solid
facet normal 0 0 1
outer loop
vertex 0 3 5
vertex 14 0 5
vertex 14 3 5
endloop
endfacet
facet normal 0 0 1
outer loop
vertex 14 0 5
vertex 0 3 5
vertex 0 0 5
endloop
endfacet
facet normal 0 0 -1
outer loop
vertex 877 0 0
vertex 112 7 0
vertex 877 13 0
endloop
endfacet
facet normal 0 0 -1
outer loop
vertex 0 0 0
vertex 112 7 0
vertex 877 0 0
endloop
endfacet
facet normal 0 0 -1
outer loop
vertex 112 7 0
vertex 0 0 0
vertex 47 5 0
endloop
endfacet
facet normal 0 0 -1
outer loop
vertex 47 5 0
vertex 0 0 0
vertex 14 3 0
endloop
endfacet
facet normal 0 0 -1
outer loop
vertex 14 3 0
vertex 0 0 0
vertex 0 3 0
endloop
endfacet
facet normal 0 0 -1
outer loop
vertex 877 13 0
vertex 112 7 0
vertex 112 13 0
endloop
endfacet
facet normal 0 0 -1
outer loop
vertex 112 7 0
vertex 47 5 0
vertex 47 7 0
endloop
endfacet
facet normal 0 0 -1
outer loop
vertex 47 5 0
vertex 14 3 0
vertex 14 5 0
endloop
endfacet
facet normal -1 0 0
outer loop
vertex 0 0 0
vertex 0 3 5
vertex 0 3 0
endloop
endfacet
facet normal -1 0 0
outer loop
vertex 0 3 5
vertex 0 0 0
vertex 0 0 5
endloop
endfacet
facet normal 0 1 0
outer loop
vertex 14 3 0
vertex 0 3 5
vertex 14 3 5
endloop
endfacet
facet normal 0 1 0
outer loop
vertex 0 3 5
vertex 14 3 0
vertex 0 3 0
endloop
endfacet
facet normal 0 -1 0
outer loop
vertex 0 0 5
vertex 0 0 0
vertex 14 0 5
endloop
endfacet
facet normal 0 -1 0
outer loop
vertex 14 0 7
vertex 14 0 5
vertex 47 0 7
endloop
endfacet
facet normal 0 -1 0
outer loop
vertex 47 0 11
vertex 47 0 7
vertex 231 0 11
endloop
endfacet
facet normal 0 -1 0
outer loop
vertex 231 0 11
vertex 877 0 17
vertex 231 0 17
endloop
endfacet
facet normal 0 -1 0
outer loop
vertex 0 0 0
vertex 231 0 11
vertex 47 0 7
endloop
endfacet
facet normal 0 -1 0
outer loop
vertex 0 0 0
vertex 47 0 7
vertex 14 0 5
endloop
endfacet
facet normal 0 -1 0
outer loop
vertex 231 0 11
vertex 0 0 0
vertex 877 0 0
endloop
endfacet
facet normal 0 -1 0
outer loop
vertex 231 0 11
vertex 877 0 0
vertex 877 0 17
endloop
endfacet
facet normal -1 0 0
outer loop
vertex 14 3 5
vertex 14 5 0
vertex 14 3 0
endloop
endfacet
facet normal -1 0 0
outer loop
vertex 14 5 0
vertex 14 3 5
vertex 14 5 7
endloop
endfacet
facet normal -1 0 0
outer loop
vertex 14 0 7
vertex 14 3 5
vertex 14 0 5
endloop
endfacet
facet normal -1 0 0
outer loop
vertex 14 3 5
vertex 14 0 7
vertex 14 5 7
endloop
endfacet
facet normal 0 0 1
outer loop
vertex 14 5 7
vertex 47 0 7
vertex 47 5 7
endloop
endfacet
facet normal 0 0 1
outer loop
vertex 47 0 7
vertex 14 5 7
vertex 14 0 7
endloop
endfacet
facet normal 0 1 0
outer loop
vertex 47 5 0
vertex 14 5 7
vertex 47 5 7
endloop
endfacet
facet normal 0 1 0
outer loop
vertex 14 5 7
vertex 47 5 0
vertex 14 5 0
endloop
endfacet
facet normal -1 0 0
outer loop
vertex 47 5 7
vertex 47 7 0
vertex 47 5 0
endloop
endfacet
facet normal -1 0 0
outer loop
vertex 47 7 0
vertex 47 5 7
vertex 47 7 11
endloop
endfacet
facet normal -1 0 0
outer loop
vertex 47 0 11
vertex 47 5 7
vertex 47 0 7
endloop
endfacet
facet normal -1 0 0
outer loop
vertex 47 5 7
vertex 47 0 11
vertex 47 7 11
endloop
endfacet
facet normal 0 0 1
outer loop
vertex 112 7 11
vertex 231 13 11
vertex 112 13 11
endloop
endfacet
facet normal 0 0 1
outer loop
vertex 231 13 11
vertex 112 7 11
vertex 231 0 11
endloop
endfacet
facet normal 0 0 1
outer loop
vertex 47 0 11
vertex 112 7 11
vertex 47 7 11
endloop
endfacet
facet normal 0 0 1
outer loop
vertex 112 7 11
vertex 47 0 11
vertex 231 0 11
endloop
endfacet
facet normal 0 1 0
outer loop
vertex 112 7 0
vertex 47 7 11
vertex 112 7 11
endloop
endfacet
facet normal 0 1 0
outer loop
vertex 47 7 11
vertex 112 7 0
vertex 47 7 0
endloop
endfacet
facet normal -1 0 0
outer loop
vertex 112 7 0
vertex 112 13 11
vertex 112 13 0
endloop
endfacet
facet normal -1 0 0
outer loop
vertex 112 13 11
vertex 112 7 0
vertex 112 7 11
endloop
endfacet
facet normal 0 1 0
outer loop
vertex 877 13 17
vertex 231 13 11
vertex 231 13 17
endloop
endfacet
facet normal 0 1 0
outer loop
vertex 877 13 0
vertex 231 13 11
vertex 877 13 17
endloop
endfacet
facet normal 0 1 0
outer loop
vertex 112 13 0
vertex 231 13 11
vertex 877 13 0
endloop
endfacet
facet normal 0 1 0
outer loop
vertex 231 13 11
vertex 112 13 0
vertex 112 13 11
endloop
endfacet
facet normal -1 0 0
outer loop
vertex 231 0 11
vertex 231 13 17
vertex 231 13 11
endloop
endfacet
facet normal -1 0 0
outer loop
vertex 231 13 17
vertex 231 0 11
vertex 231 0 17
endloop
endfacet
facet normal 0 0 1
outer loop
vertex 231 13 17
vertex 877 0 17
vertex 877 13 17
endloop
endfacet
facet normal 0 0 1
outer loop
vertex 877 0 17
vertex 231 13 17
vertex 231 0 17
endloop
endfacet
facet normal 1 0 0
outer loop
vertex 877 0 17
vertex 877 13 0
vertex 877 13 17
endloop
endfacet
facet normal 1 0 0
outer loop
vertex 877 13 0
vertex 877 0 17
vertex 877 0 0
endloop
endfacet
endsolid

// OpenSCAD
translate([1.0, 1.5, 2.5]) color([0.2855057910835891, 0.5410756974595614, 0.2011850454737838]) cube([2, 3, 5], center=true);
translate([3.0, 1.5, 2.5]) color([0.2966412512769129, 0.44178363318767744, 0.604669902191143]) cube([2, 3, 5], center=true);
translate([5.0, 1.5, 2.5]) color([0.5361650260862432, 0.2609879767339395, 0.23178787541805523]) cube([2, 3, 5], center=true);
translate([7.0, 1.5, 2.5]) color([0.11873023670071103, 0.7834936358921726, 0.09890076646638046]) cube([2, 3, 5], center=true);
translate([9.0, 1.5, 2.5]) color([0.7328850061793606, 0.2487736956630997, 0.28455698400578255]) cube([2, 3, 5], center=true);
translate([11.0, 1.5, 2.5]) color([0.7360834330107994, 0.6596207917216363, 0.7419215555155583]) cube([2, 3, 5], center=true);
translate([13.0, 1.5, 2.5]) color([0.5152830587943614, 0.8590958196652707, 0.12179389137547159]) cube([2, 3, 5], center=true);
translate([15.5, 2.5, 3.5]) color([0.6451969614065052, 0.11824431248865597, 0.7372833681454282]) cube([3, 5, 7], center=true);
translate([18.5, 2.5, 3.5]) color([0.3589046614584527, 0.67488210437111, 0.7034839134412817]) cube([3, 5, 7], center=true);
translate([21.5, 2.5, 3.5]) color([0.6606084576410584, 0.22155798032782648, 0.8317998863873537]) cube([3, 5, 7], center=true);
translate([24.5, 2.5, 3.5]) color([0.24013608742346748, 0.5181532972121122, 0.6746457541533513]) cube([3, 5, 7], center=true);
translate([27.5, 2.5, 3.5]) color([0.23360317478475656, 0.628511722983939, 0.2868310479973286]) cube([3, 5, 7], center=true);
translate([30.5, 2.5, 3.5]) color([0.1713823760843869, 0.809748828526577, 0.5531227700773604]) cube([3, 5, 7], center=true);
translate([33.5, 2.5, 3.5]) color([0.32788470660885605, 0.5854309472055399, 0.025286397427288332]) cube([3, 5, 7], center=true);
translate([36.5, 2.5, 3.5]) color([0.12982285676032723, 0.3955808516982431, 0.9757565794644123]) cube([3, 5, 7], center=true);
translate([39.5, 2.5, 3.5]) color([0.5104745178761232, 0.07645620506689521, 0.7650406152494567]) cube([3, 5, 7], center=true);
translate([42.5, 2.5, 3.5]) color([0.7814438709253152, 0.7748021743948562, 0.5694980380479538]) cube([3, 5, 7], center=true);
translate([45.5, 2.5, 3.5]) color([0.6956987378694627, 0.21345793631163135, 0.7325605908939883]) cube([3, 5, 7], center=true);
translate([49.5, 3.5, 5.5]) color([0.8161739873415944, 0.7599665402219192, 0.353462402585887]) cube([5, 7, 11], center=true);
translate([54.5, 3.5, 5.5]) color([0.5910280505757086, 0.6289893574898388, 0.9008098536570839]) cube([5, 7, 11], center=true);
translate([59.5, 3.5, 5.5]) color([0.1080138952733335, 0.8339337708504084, 0.5264355584690392]) cube([5, 7, 11], center=true);
translate([64.5, 3.5, 5.5]) color([0.3586141205519373, 0.4556029014937524, 0.012635498930738787]) cube([5, 7, 11], center=true);
translate([69.5, 3.5, 5.5]) color([0.22007359233142765, 0.6527634200680049, 0.660849279754449]) cube([5, 7, 11], center=true);
translate([74.5, 3.5, 5.5]) color([0.4946989402863131, 0.9533258805973196, 0.4809150885494712]) cube([5, 7, 11], center=true);
translate([79.5, 3.5, 5.5]) color([0.3139436595456605, 0.8477808391956414, 0.259158299397262]) cube([5, 7, 11], center=true);
translate([84.5, 3.5, 5.5]) color([0.6043059930343495, 0.7034188523223, 0.8216962986917842]) cube([5, 7, 11], center=true);
translate([89.5, 3.5, 5.5]) color([0.7853687501827489, 0.3840923305137113, 0.059180305962736934]) cube([5, 7, 11], center=true);
translate([94.5, 3.5, 5.5]) color([0.03828786548344276, 0.7264603879084595, 0.9616913814068508]) cube([5, 7, 11], center=true);
translate([99.5, 3.5, 5.5]) color([0.3431653742712939, 0.44119509807551416, 0.7257980157417766]) cube([5, 7, 11], center=true);
translate([104.5, 3.5, 5.5]) color([0.6578312458538799, 0.26010658848413604, 0.6715848457987025]) cube([5, 7, 11], center=true);
translate([109.5, 3.5, 5.5]) color([0.3049024195743838, 0.3563579065620385, 0.5395133052630944]) cube([5, 7, 11], center=true);
translate([115.5, 6.5, 5.5]) color([0.7323138239267305, 0.15121621156796483, 0.021987210892938758]) cube([7, 13, 11], center=true);
translate([122.5, 6.5, 5.5]) color([0.6278299544850219, 0.024564677785836264, 0.04496324071616853]) cube([7, 13, 11], center=true);
translate([129.5, 6.5, 5.5]) color([0.22577557672213355, 0.6538768733044555, 0.06654509768602879]) cube([7, 13, 11], center=true);
translate([136.5, 6.5, 5.5]) color([0.06240576762652772, 0.9720932443736168, 0.4226528937805498]) cube([7, 13, 11], center=true);
translate([143.5, 6.5, 5.5]) color([0.8924289339928592, 0.21652428395276402, 0.4352131794546169]) cube([7, 13, 11], center=true);
translate([150.5, 6.5, 5.5]) color([0.35803513461315506, 0.17693553603496914, 0.32881318575191665]) cube([7, 13, 11], center=true);
translate([157.5, 6.5, 5.5]) color([0.9867958186960467, 0.7473090097951195, 0.3826682791831585]) cube([7, 13, 11], center=true);
translate([164.5, 6.5, 5.5]) color([0.40928443439993156, 0.2637409011550663, 0.531336678598825]) cube([7, 13, 11], center=true);
translate([171.5, 6.5, 5.5]) color([0.7356369121419466, 0.686646615750601, 0.46264983534131954]) cube([7, 13, 11], center=true);
translate([178.5, 6.5, 5.5]) color([0.041939046716157, 0.9215078064992686, 0.4089338030960661]) cube([7, 13, 11], center=true);
translate([185.5, 6.5, 5.5]) color([0.3902988670119316, 0.0031101144891549914, 0.13822721408191307]) cube([7, 13, 11], center=true);
translate([192.5, 6.5, 5.5]) color([0.8688534175006787, 0.513934596181303, 0.7324348442226767]) cube([7, 13, 11], center=true);
translate([199.5, 6.5, 5.5]) color([0.14816788643335854, 0.33005100665524945, 0.8401365565378639]) cube([7, 13, 11], center=true);
translate([206.5, 6.5, 5.5]) color([0.8206585211774247, 0.2467942680862406, 0.021975308333072263]) cube([7, 13, 11], center=true);
translate([213.5, 6.5, 5.5]) color([0.8064669735456029, 0.16884400503942165, 0.7876813921208954]) cube([7, 13, 11], center=true);
translate([220.5, 6.5, 5.5]) color([0.6836592298851071, 0.1683147603108942, 0.0784886436699127]) cube([7, 13, 11], center=true);
translate([227.5, 6.5, 5.5]) color([0.9276494299222889, 0.5978783972833935, 0.620510173056511]) cube([7, 13, 11], center=true);
translate([236.5, 6.5, 8.5]) color([0.4575118028380537, 0.15007097732228858, 0.6019699129465877]) cube([11, 13, 17], center=true);
translate([247.5, 6.5, 8.5]) color([0.2524728800375037, 0.8058946560175415, 0.732718954805416]) cube([11, 13, 17], center=true);
translate([258.5, 6.5, 8.5]) color([0.027267185045511733, 0.9324230096450348, 0.03631604832667812]) cube([11, 13, 17], center=true);
translate([269.5, 6.5, 8.5]) color([0.0896193188307074, 0.2927345609042453, 0.1508090604701401]) cube([11, 13, 17], center=true);
translate([280.5, 6.5, 8.5]) color([0.2361450829166024, 0.3558094886115547, 0.7354997154547138]) cube([11, 13, 17], center=true);
translate([291.5, 6.5, 8.5]) color([0.4047113607648444, 0.2698397547254259, 0.4923131536276696]) cube([11, 13, 17], center=true);
translate([302.5, 6.5, 8.5]) color([0.39259324978876053, 0.310764197486207, 0.900541657866744]) cube([11, 13, 17], center=true);
translate([313.5, 6.5, 8.5]) color([0.5504484509596044, 0.9773275109747672, 0.7729124093934382]) cube([11, 13, 17], center=true);
translate([324.5, 6.5, 8.5]) color([0.570499297619577, 0.26244658927686404, 0.6868436562888387]) cube([11, 13, 17], center=true);
translate([335.5, 6.5, 8.5]) color([0.45591771896977173, 0.7213877150417534, 0.40377880891106155]) cube([11, 13, 17], center=true);
translate([346.5, 6.5, 8.5]) color([0.49600503631794757, 0.02068376744575562, 0.739958502320053]) cube([11, 13, 17], center=true);
translate([357.5, 6.5, 8.5]) color([0.03427354435563068, 0.6807253858476396, 0.5820036955379622]) cube([11, 13, 17], center=true);
translate([368.5, 6.5, 8.5]) color([0.7759176114881267, 0.28977759923741564, 0.6861108151233298]) cube([11, 13, 17], center=true);
translate([379.5, 6.5, 8.5]) color([0.20709797563103816, 0.5292720013578311, 0.34028037925118015]) cube([11, 13, 17], center=true);
translate([390.5, 6.5, 8.5]) color([0.9784545513570129, 0.9718665573793185, 0.20896973547336006]) cube([11, 13, 17], center=true);
translate([401.5, 6.5, 8.5]) color([0.5660382358858294, 0.3294426858782725, 0.9685381870202809]) cube([11, 13, 17], center=true);
translate([412.5, 6.5, 8.5]) color([0.9245259481865659, 0.5861458530564896, 0.7200844551084937]) cube([11, 13, 17], center=true);
translate([423.5, 6.5, 8.5]) color([0.6813247567090696, 0.353355632443361, 0.91636156937516]) cube([11, 13, 17], center=true);
translate([434.5, 6.5, 8.5]) color([0.899453536816357, 0.33065846447807934, 0.7473949106043586]) cube([11, 13, 17], center=true);
translate([449.5, 6.5, 8.5]) color([0.009092126674448586, 0.8163591105584419, 0.5648693453979996]) cube([19, 13, 17], center=true);
translate([468.5, 6.5, 8.5]) color([0.9523067127509502, 0.3631930745481745, 0.6257130749033707]) cube([19, 13, 17], center=true);
translate([487.5, 6.5, 8.5]) color([0.3230024315033787, 0.7827853814039997, 0.6007029967830003]) cube([19, 13, 17], center=true);
translate([506.5, 6.5, 8.5]) color([0.9874710229786893, 0.0010127930964535237, 0.14075874215813544]) cube([19, 13, 17], center=true);
translate([525.5, 6.5, 8.5]) color([0.043601382090813434, 0.1258478488128345, 0.9293852970698306]) cube([19, 13, 17], center=true);
translate([544.5, 6.5, 8.5]) color([0.9486082995058949, 0.4804125346981437, 0.9466893945947962]) cube([19, 13, 17], center=true);
translate([563.5, 6.5, 8.5]) color([0.818387610188399, 0.7786177341461099, 0.747281950803196]) cube([19, 13, 17], center=true);
translate([582.5, 6.5, 8.5]) color([0.18765458516959888, 0.5488772611027803, 0.4238792306088448]) cube([19, 13, 17], center=true);
translate([601.5, 6.5, 8.5]) color([0.949788047597888, 0.17383353806681645, 0.16985884355967462]) cube([19, 13, 17], center=true);
translate([620.5, 6.5, 8.5]) color([0.6588617536380149, 0.15740178957348283, 0.11005367295186075]) cube([19, 13, 17], center=true);
translate([639.5, 6.5, 8.5]) color([0.5039231973300066, 0.796660971220008, 0.6050456716470326]) cube([19, 13, 17], center=true);
translate([658.5, 6.5, 8.5]) color([0.7547539728480395, 0.2657585316255522, 0.28496283302929337]) cube([19, 13, 17], center=true);
translate([677.5, 6.5, 8.5]) color([0.42870364173152453, 0.990847884265713, 0.7179182565245089]) cube([19, 13, 17], center=true);
translate([696.5, 6.5, 8.5]) color([0.9462539572878983, 0.537870455736408, 0.5545598515713968]) cube([19, 13, 17], center=true);
translate([715.5, 6.5, 8.5]) color([0.9900903354753839, 0.18998827565888077, 0.7825904371715813]) cube([19, 13, 17], center=true);
translate([734.5, 6.5, 8.5]) color([0.7915138240285756, 0.8447416276181308, 0.7500527092169327]) cube([19, 13, 17], center=true);
translate([753.5, 6.5, 8.5]) color([0.15533301818854706, 0.661127632121674, 0.9237031845862264]) cube([19, 13, 17], center=true);
translate([772.5, 6.5, 8.5]) color([0.5632851524959844, 0.3609415103802872, 0.9495201486078587]) cube([19, 13, 17], center=true);
translate([791.5, 6.5, 8.5]) color([0.5615986504586717, 0.41163639453549183, 0.6141334980612769]) cube([19, 13, 17], center=true);
translate([810.5, 6.5, 8.5]) color([0.8041250166314531, 0.22830209061365048, 0.01569204302297844]) cube([19, 13, 17], center=true);
translate([829.5, 6.5, 8.5]) color([0.5290948970731422, 0.9413574200758085, 0.6802579626031922]) cube([19, 13, 17], center=true);
translate([848.5, 6.5, 8.5]) color([0.6309080001300065, 0.6278151474899732, 0.4969897122617175]) cube([19, 13, 17], center=true);
translate([867.5, 6.5, 8.5]) color([0.7309192697350546, 0.2491944400337247, 0.891754263952968]) cube([19, 13, 17], center=true);
